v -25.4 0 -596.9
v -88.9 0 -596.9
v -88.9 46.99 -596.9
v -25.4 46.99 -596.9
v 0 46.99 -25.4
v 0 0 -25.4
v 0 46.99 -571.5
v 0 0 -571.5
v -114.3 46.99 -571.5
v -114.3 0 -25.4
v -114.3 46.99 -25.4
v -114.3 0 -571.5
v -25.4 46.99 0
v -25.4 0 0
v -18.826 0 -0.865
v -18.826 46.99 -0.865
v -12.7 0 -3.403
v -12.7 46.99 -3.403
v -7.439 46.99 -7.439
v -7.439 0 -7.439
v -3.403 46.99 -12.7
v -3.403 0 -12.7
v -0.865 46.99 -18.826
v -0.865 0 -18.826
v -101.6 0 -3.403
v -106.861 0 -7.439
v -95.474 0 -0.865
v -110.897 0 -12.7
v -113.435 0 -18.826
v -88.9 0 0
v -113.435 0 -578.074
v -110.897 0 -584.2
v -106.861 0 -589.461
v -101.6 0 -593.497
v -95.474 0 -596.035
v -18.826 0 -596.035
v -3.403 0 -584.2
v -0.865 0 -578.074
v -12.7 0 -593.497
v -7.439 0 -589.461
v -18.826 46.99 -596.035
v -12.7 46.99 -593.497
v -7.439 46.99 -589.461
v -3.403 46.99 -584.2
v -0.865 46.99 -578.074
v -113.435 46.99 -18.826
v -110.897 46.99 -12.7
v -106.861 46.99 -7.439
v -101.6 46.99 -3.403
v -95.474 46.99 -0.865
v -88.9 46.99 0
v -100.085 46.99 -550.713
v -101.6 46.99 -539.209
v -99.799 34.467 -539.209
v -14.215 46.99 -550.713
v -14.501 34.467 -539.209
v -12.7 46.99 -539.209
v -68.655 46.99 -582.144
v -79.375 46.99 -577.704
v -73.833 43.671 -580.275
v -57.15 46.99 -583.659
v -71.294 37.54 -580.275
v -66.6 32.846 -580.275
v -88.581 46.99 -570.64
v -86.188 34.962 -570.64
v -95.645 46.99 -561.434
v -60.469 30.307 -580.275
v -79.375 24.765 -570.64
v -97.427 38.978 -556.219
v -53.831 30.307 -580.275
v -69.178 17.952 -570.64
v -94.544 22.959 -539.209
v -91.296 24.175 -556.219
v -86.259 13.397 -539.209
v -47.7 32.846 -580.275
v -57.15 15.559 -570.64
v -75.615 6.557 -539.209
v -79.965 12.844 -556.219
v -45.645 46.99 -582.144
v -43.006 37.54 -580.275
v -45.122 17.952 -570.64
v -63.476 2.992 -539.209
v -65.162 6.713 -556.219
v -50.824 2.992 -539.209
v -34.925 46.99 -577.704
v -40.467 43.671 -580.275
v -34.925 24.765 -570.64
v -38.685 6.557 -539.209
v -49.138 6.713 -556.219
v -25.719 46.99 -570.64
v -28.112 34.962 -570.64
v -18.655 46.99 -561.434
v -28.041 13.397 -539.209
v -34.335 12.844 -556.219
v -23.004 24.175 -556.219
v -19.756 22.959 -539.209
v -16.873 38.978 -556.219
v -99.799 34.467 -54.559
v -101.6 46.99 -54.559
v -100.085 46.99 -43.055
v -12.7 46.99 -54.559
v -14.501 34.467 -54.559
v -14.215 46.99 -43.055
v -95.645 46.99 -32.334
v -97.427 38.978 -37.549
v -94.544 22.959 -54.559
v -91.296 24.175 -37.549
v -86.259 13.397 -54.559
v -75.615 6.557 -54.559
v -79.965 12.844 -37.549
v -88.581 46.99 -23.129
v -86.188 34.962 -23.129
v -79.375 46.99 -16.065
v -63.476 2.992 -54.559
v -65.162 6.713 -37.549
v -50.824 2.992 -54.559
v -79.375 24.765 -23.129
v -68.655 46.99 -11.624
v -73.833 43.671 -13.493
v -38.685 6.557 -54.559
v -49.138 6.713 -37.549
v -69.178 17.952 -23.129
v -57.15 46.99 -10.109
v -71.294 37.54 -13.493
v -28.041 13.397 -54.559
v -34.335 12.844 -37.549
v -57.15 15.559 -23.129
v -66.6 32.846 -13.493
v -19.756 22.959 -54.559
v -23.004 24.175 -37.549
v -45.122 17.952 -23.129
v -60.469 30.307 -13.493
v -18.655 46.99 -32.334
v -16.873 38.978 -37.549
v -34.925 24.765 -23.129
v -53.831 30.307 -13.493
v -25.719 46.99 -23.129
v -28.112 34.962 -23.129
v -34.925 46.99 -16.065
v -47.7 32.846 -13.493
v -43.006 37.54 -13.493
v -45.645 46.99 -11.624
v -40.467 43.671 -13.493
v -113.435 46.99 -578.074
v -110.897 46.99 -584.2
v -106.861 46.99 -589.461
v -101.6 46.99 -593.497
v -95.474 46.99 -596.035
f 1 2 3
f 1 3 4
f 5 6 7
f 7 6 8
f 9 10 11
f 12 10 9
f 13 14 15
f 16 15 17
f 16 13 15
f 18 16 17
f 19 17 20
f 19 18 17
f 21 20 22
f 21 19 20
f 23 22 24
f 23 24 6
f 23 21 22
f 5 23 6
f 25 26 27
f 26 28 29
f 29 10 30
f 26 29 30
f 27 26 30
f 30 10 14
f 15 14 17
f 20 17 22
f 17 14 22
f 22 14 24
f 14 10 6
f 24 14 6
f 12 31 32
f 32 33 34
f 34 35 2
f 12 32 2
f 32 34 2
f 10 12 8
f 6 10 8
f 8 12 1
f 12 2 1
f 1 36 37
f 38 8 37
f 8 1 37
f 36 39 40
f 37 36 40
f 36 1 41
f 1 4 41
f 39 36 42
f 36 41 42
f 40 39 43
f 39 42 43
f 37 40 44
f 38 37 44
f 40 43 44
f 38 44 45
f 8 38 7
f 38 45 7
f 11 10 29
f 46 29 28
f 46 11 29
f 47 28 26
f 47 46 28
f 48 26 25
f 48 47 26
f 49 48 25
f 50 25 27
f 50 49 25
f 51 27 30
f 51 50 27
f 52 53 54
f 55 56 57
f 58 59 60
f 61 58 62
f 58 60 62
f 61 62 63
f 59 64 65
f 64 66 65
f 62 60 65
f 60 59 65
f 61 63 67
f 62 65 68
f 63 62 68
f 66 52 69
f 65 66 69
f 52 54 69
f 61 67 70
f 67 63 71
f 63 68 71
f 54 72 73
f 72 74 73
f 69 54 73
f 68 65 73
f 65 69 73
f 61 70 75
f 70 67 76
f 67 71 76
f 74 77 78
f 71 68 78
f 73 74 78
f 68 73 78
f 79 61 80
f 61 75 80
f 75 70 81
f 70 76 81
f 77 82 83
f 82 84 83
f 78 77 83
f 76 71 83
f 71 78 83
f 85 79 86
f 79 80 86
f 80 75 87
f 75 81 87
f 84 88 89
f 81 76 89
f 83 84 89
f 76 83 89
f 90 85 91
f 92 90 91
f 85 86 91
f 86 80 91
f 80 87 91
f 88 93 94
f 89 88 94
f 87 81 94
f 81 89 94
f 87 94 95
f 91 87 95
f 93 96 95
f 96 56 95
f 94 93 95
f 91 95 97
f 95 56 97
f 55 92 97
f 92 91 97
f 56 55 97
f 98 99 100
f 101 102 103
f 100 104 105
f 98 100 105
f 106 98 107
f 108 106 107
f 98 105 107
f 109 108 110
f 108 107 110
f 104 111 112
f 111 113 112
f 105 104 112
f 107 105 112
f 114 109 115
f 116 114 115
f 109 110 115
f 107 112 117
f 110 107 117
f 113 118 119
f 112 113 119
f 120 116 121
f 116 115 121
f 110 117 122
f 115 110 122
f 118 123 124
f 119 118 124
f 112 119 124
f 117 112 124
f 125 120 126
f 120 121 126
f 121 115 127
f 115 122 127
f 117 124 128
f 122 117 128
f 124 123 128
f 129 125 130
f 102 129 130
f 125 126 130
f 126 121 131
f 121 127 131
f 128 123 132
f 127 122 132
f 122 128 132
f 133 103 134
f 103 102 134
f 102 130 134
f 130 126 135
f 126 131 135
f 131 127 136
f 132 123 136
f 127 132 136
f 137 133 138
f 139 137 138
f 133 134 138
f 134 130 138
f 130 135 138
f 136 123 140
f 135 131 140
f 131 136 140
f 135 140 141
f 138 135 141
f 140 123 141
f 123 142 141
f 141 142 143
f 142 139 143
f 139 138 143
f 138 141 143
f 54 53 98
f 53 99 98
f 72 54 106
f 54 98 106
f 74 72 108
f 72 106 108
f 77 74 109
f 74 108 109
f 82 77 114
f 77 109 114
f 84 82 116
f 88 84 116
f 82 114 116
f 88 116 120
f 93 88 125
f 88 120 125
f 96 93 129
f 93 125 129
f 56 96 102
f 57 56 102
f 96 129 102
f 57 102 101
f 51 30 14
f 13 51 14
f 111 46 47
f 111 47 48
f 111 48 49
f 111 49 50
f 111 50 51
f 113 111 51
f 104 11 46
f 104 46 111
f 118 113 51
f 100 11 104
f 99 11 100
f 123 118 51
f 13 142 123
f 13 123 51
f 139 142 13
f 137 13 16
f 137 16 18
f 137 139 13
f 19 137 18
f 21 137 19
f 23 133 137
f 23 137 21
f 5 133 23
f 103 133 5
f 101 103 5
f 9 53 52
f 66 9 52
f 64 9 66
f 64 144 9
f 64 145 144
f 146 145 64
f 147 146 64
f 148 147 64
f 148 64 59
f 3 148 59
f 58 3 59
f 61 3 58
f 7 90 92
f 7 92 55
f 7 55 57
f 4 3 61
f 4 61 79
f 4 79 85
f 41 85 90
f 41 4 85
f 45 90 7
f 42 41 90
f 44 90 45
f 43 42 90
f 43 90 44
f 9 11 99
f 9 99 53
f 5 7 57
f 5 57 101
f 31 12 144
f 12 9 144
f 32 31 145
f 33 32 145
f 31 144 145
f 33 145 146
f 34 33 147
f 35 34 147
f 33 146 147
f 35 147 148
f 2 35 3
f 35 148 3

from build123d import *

# Parameters (mm, degrees)
SKETCH1_W           = 114.3
SKETCH1_H           = 596.9
BOSS_EXTRUDE1_DEPTH = 46.99
CUT_REVOLVE1_ANGLE  = 180
FILLET1_R           = 25.4


with BuildPart() as part:
    # Sketch1 → Boss-Extrude1 (new body)
    with BuildSketch(Plane(origin=(0, 0, 0), x_dir=(1, 0, 0), z_dir=(0, 1, 0))):
        with Locations((-57.15, 298.45)):
            Rectangle(SKETCH1_W, SKETCH1_H)
    extrude(amount=BOSS_EXTRUDE1_DEPTH)

    # Sketch2 → Cut-Revolve1 (revolve, cut)
    with BuildSketch(Plane(origin=(0, 46.99, 0), x_dir=(1, 0, 0), z_dir=(0, 1, 0))):
        with BuildLine():
            ThreePointArc((-12.7, 539.208766564), (-25.719103576, 570.639662987), (-57.15, 583.658766564))
            Line((-57.15, 583.658766564), (-57.15, 10.109470377))
            ThreePointArc((-57.15, 10.109470377), (-25.719103576, 23.128573953), (-12.7, 54.559470377))
            Line((-12.7, 54.559470377), (-12.7, 539.208766564))
        make_face()
    revolve(axis=Axis((-57.15, 46.99, -596.9), (0, 0, -1)), revolution_arc=CUT_REVOLVE1_ANGLE, mode=Mode.SUBTRACT)

    # Fillet1
    fillet1_edges = [part.edges().sort_by_distance(p)[0] for p in [
        (0, 23.495, 0),
        (-114.3, 23.495, 0),
        (-114.3, 23.495, -596.9),
        (0, 23.495, -596.9),
    ]]
    fillet(fillet1_edges, radius=FILLET1_R)


solid = part.part
